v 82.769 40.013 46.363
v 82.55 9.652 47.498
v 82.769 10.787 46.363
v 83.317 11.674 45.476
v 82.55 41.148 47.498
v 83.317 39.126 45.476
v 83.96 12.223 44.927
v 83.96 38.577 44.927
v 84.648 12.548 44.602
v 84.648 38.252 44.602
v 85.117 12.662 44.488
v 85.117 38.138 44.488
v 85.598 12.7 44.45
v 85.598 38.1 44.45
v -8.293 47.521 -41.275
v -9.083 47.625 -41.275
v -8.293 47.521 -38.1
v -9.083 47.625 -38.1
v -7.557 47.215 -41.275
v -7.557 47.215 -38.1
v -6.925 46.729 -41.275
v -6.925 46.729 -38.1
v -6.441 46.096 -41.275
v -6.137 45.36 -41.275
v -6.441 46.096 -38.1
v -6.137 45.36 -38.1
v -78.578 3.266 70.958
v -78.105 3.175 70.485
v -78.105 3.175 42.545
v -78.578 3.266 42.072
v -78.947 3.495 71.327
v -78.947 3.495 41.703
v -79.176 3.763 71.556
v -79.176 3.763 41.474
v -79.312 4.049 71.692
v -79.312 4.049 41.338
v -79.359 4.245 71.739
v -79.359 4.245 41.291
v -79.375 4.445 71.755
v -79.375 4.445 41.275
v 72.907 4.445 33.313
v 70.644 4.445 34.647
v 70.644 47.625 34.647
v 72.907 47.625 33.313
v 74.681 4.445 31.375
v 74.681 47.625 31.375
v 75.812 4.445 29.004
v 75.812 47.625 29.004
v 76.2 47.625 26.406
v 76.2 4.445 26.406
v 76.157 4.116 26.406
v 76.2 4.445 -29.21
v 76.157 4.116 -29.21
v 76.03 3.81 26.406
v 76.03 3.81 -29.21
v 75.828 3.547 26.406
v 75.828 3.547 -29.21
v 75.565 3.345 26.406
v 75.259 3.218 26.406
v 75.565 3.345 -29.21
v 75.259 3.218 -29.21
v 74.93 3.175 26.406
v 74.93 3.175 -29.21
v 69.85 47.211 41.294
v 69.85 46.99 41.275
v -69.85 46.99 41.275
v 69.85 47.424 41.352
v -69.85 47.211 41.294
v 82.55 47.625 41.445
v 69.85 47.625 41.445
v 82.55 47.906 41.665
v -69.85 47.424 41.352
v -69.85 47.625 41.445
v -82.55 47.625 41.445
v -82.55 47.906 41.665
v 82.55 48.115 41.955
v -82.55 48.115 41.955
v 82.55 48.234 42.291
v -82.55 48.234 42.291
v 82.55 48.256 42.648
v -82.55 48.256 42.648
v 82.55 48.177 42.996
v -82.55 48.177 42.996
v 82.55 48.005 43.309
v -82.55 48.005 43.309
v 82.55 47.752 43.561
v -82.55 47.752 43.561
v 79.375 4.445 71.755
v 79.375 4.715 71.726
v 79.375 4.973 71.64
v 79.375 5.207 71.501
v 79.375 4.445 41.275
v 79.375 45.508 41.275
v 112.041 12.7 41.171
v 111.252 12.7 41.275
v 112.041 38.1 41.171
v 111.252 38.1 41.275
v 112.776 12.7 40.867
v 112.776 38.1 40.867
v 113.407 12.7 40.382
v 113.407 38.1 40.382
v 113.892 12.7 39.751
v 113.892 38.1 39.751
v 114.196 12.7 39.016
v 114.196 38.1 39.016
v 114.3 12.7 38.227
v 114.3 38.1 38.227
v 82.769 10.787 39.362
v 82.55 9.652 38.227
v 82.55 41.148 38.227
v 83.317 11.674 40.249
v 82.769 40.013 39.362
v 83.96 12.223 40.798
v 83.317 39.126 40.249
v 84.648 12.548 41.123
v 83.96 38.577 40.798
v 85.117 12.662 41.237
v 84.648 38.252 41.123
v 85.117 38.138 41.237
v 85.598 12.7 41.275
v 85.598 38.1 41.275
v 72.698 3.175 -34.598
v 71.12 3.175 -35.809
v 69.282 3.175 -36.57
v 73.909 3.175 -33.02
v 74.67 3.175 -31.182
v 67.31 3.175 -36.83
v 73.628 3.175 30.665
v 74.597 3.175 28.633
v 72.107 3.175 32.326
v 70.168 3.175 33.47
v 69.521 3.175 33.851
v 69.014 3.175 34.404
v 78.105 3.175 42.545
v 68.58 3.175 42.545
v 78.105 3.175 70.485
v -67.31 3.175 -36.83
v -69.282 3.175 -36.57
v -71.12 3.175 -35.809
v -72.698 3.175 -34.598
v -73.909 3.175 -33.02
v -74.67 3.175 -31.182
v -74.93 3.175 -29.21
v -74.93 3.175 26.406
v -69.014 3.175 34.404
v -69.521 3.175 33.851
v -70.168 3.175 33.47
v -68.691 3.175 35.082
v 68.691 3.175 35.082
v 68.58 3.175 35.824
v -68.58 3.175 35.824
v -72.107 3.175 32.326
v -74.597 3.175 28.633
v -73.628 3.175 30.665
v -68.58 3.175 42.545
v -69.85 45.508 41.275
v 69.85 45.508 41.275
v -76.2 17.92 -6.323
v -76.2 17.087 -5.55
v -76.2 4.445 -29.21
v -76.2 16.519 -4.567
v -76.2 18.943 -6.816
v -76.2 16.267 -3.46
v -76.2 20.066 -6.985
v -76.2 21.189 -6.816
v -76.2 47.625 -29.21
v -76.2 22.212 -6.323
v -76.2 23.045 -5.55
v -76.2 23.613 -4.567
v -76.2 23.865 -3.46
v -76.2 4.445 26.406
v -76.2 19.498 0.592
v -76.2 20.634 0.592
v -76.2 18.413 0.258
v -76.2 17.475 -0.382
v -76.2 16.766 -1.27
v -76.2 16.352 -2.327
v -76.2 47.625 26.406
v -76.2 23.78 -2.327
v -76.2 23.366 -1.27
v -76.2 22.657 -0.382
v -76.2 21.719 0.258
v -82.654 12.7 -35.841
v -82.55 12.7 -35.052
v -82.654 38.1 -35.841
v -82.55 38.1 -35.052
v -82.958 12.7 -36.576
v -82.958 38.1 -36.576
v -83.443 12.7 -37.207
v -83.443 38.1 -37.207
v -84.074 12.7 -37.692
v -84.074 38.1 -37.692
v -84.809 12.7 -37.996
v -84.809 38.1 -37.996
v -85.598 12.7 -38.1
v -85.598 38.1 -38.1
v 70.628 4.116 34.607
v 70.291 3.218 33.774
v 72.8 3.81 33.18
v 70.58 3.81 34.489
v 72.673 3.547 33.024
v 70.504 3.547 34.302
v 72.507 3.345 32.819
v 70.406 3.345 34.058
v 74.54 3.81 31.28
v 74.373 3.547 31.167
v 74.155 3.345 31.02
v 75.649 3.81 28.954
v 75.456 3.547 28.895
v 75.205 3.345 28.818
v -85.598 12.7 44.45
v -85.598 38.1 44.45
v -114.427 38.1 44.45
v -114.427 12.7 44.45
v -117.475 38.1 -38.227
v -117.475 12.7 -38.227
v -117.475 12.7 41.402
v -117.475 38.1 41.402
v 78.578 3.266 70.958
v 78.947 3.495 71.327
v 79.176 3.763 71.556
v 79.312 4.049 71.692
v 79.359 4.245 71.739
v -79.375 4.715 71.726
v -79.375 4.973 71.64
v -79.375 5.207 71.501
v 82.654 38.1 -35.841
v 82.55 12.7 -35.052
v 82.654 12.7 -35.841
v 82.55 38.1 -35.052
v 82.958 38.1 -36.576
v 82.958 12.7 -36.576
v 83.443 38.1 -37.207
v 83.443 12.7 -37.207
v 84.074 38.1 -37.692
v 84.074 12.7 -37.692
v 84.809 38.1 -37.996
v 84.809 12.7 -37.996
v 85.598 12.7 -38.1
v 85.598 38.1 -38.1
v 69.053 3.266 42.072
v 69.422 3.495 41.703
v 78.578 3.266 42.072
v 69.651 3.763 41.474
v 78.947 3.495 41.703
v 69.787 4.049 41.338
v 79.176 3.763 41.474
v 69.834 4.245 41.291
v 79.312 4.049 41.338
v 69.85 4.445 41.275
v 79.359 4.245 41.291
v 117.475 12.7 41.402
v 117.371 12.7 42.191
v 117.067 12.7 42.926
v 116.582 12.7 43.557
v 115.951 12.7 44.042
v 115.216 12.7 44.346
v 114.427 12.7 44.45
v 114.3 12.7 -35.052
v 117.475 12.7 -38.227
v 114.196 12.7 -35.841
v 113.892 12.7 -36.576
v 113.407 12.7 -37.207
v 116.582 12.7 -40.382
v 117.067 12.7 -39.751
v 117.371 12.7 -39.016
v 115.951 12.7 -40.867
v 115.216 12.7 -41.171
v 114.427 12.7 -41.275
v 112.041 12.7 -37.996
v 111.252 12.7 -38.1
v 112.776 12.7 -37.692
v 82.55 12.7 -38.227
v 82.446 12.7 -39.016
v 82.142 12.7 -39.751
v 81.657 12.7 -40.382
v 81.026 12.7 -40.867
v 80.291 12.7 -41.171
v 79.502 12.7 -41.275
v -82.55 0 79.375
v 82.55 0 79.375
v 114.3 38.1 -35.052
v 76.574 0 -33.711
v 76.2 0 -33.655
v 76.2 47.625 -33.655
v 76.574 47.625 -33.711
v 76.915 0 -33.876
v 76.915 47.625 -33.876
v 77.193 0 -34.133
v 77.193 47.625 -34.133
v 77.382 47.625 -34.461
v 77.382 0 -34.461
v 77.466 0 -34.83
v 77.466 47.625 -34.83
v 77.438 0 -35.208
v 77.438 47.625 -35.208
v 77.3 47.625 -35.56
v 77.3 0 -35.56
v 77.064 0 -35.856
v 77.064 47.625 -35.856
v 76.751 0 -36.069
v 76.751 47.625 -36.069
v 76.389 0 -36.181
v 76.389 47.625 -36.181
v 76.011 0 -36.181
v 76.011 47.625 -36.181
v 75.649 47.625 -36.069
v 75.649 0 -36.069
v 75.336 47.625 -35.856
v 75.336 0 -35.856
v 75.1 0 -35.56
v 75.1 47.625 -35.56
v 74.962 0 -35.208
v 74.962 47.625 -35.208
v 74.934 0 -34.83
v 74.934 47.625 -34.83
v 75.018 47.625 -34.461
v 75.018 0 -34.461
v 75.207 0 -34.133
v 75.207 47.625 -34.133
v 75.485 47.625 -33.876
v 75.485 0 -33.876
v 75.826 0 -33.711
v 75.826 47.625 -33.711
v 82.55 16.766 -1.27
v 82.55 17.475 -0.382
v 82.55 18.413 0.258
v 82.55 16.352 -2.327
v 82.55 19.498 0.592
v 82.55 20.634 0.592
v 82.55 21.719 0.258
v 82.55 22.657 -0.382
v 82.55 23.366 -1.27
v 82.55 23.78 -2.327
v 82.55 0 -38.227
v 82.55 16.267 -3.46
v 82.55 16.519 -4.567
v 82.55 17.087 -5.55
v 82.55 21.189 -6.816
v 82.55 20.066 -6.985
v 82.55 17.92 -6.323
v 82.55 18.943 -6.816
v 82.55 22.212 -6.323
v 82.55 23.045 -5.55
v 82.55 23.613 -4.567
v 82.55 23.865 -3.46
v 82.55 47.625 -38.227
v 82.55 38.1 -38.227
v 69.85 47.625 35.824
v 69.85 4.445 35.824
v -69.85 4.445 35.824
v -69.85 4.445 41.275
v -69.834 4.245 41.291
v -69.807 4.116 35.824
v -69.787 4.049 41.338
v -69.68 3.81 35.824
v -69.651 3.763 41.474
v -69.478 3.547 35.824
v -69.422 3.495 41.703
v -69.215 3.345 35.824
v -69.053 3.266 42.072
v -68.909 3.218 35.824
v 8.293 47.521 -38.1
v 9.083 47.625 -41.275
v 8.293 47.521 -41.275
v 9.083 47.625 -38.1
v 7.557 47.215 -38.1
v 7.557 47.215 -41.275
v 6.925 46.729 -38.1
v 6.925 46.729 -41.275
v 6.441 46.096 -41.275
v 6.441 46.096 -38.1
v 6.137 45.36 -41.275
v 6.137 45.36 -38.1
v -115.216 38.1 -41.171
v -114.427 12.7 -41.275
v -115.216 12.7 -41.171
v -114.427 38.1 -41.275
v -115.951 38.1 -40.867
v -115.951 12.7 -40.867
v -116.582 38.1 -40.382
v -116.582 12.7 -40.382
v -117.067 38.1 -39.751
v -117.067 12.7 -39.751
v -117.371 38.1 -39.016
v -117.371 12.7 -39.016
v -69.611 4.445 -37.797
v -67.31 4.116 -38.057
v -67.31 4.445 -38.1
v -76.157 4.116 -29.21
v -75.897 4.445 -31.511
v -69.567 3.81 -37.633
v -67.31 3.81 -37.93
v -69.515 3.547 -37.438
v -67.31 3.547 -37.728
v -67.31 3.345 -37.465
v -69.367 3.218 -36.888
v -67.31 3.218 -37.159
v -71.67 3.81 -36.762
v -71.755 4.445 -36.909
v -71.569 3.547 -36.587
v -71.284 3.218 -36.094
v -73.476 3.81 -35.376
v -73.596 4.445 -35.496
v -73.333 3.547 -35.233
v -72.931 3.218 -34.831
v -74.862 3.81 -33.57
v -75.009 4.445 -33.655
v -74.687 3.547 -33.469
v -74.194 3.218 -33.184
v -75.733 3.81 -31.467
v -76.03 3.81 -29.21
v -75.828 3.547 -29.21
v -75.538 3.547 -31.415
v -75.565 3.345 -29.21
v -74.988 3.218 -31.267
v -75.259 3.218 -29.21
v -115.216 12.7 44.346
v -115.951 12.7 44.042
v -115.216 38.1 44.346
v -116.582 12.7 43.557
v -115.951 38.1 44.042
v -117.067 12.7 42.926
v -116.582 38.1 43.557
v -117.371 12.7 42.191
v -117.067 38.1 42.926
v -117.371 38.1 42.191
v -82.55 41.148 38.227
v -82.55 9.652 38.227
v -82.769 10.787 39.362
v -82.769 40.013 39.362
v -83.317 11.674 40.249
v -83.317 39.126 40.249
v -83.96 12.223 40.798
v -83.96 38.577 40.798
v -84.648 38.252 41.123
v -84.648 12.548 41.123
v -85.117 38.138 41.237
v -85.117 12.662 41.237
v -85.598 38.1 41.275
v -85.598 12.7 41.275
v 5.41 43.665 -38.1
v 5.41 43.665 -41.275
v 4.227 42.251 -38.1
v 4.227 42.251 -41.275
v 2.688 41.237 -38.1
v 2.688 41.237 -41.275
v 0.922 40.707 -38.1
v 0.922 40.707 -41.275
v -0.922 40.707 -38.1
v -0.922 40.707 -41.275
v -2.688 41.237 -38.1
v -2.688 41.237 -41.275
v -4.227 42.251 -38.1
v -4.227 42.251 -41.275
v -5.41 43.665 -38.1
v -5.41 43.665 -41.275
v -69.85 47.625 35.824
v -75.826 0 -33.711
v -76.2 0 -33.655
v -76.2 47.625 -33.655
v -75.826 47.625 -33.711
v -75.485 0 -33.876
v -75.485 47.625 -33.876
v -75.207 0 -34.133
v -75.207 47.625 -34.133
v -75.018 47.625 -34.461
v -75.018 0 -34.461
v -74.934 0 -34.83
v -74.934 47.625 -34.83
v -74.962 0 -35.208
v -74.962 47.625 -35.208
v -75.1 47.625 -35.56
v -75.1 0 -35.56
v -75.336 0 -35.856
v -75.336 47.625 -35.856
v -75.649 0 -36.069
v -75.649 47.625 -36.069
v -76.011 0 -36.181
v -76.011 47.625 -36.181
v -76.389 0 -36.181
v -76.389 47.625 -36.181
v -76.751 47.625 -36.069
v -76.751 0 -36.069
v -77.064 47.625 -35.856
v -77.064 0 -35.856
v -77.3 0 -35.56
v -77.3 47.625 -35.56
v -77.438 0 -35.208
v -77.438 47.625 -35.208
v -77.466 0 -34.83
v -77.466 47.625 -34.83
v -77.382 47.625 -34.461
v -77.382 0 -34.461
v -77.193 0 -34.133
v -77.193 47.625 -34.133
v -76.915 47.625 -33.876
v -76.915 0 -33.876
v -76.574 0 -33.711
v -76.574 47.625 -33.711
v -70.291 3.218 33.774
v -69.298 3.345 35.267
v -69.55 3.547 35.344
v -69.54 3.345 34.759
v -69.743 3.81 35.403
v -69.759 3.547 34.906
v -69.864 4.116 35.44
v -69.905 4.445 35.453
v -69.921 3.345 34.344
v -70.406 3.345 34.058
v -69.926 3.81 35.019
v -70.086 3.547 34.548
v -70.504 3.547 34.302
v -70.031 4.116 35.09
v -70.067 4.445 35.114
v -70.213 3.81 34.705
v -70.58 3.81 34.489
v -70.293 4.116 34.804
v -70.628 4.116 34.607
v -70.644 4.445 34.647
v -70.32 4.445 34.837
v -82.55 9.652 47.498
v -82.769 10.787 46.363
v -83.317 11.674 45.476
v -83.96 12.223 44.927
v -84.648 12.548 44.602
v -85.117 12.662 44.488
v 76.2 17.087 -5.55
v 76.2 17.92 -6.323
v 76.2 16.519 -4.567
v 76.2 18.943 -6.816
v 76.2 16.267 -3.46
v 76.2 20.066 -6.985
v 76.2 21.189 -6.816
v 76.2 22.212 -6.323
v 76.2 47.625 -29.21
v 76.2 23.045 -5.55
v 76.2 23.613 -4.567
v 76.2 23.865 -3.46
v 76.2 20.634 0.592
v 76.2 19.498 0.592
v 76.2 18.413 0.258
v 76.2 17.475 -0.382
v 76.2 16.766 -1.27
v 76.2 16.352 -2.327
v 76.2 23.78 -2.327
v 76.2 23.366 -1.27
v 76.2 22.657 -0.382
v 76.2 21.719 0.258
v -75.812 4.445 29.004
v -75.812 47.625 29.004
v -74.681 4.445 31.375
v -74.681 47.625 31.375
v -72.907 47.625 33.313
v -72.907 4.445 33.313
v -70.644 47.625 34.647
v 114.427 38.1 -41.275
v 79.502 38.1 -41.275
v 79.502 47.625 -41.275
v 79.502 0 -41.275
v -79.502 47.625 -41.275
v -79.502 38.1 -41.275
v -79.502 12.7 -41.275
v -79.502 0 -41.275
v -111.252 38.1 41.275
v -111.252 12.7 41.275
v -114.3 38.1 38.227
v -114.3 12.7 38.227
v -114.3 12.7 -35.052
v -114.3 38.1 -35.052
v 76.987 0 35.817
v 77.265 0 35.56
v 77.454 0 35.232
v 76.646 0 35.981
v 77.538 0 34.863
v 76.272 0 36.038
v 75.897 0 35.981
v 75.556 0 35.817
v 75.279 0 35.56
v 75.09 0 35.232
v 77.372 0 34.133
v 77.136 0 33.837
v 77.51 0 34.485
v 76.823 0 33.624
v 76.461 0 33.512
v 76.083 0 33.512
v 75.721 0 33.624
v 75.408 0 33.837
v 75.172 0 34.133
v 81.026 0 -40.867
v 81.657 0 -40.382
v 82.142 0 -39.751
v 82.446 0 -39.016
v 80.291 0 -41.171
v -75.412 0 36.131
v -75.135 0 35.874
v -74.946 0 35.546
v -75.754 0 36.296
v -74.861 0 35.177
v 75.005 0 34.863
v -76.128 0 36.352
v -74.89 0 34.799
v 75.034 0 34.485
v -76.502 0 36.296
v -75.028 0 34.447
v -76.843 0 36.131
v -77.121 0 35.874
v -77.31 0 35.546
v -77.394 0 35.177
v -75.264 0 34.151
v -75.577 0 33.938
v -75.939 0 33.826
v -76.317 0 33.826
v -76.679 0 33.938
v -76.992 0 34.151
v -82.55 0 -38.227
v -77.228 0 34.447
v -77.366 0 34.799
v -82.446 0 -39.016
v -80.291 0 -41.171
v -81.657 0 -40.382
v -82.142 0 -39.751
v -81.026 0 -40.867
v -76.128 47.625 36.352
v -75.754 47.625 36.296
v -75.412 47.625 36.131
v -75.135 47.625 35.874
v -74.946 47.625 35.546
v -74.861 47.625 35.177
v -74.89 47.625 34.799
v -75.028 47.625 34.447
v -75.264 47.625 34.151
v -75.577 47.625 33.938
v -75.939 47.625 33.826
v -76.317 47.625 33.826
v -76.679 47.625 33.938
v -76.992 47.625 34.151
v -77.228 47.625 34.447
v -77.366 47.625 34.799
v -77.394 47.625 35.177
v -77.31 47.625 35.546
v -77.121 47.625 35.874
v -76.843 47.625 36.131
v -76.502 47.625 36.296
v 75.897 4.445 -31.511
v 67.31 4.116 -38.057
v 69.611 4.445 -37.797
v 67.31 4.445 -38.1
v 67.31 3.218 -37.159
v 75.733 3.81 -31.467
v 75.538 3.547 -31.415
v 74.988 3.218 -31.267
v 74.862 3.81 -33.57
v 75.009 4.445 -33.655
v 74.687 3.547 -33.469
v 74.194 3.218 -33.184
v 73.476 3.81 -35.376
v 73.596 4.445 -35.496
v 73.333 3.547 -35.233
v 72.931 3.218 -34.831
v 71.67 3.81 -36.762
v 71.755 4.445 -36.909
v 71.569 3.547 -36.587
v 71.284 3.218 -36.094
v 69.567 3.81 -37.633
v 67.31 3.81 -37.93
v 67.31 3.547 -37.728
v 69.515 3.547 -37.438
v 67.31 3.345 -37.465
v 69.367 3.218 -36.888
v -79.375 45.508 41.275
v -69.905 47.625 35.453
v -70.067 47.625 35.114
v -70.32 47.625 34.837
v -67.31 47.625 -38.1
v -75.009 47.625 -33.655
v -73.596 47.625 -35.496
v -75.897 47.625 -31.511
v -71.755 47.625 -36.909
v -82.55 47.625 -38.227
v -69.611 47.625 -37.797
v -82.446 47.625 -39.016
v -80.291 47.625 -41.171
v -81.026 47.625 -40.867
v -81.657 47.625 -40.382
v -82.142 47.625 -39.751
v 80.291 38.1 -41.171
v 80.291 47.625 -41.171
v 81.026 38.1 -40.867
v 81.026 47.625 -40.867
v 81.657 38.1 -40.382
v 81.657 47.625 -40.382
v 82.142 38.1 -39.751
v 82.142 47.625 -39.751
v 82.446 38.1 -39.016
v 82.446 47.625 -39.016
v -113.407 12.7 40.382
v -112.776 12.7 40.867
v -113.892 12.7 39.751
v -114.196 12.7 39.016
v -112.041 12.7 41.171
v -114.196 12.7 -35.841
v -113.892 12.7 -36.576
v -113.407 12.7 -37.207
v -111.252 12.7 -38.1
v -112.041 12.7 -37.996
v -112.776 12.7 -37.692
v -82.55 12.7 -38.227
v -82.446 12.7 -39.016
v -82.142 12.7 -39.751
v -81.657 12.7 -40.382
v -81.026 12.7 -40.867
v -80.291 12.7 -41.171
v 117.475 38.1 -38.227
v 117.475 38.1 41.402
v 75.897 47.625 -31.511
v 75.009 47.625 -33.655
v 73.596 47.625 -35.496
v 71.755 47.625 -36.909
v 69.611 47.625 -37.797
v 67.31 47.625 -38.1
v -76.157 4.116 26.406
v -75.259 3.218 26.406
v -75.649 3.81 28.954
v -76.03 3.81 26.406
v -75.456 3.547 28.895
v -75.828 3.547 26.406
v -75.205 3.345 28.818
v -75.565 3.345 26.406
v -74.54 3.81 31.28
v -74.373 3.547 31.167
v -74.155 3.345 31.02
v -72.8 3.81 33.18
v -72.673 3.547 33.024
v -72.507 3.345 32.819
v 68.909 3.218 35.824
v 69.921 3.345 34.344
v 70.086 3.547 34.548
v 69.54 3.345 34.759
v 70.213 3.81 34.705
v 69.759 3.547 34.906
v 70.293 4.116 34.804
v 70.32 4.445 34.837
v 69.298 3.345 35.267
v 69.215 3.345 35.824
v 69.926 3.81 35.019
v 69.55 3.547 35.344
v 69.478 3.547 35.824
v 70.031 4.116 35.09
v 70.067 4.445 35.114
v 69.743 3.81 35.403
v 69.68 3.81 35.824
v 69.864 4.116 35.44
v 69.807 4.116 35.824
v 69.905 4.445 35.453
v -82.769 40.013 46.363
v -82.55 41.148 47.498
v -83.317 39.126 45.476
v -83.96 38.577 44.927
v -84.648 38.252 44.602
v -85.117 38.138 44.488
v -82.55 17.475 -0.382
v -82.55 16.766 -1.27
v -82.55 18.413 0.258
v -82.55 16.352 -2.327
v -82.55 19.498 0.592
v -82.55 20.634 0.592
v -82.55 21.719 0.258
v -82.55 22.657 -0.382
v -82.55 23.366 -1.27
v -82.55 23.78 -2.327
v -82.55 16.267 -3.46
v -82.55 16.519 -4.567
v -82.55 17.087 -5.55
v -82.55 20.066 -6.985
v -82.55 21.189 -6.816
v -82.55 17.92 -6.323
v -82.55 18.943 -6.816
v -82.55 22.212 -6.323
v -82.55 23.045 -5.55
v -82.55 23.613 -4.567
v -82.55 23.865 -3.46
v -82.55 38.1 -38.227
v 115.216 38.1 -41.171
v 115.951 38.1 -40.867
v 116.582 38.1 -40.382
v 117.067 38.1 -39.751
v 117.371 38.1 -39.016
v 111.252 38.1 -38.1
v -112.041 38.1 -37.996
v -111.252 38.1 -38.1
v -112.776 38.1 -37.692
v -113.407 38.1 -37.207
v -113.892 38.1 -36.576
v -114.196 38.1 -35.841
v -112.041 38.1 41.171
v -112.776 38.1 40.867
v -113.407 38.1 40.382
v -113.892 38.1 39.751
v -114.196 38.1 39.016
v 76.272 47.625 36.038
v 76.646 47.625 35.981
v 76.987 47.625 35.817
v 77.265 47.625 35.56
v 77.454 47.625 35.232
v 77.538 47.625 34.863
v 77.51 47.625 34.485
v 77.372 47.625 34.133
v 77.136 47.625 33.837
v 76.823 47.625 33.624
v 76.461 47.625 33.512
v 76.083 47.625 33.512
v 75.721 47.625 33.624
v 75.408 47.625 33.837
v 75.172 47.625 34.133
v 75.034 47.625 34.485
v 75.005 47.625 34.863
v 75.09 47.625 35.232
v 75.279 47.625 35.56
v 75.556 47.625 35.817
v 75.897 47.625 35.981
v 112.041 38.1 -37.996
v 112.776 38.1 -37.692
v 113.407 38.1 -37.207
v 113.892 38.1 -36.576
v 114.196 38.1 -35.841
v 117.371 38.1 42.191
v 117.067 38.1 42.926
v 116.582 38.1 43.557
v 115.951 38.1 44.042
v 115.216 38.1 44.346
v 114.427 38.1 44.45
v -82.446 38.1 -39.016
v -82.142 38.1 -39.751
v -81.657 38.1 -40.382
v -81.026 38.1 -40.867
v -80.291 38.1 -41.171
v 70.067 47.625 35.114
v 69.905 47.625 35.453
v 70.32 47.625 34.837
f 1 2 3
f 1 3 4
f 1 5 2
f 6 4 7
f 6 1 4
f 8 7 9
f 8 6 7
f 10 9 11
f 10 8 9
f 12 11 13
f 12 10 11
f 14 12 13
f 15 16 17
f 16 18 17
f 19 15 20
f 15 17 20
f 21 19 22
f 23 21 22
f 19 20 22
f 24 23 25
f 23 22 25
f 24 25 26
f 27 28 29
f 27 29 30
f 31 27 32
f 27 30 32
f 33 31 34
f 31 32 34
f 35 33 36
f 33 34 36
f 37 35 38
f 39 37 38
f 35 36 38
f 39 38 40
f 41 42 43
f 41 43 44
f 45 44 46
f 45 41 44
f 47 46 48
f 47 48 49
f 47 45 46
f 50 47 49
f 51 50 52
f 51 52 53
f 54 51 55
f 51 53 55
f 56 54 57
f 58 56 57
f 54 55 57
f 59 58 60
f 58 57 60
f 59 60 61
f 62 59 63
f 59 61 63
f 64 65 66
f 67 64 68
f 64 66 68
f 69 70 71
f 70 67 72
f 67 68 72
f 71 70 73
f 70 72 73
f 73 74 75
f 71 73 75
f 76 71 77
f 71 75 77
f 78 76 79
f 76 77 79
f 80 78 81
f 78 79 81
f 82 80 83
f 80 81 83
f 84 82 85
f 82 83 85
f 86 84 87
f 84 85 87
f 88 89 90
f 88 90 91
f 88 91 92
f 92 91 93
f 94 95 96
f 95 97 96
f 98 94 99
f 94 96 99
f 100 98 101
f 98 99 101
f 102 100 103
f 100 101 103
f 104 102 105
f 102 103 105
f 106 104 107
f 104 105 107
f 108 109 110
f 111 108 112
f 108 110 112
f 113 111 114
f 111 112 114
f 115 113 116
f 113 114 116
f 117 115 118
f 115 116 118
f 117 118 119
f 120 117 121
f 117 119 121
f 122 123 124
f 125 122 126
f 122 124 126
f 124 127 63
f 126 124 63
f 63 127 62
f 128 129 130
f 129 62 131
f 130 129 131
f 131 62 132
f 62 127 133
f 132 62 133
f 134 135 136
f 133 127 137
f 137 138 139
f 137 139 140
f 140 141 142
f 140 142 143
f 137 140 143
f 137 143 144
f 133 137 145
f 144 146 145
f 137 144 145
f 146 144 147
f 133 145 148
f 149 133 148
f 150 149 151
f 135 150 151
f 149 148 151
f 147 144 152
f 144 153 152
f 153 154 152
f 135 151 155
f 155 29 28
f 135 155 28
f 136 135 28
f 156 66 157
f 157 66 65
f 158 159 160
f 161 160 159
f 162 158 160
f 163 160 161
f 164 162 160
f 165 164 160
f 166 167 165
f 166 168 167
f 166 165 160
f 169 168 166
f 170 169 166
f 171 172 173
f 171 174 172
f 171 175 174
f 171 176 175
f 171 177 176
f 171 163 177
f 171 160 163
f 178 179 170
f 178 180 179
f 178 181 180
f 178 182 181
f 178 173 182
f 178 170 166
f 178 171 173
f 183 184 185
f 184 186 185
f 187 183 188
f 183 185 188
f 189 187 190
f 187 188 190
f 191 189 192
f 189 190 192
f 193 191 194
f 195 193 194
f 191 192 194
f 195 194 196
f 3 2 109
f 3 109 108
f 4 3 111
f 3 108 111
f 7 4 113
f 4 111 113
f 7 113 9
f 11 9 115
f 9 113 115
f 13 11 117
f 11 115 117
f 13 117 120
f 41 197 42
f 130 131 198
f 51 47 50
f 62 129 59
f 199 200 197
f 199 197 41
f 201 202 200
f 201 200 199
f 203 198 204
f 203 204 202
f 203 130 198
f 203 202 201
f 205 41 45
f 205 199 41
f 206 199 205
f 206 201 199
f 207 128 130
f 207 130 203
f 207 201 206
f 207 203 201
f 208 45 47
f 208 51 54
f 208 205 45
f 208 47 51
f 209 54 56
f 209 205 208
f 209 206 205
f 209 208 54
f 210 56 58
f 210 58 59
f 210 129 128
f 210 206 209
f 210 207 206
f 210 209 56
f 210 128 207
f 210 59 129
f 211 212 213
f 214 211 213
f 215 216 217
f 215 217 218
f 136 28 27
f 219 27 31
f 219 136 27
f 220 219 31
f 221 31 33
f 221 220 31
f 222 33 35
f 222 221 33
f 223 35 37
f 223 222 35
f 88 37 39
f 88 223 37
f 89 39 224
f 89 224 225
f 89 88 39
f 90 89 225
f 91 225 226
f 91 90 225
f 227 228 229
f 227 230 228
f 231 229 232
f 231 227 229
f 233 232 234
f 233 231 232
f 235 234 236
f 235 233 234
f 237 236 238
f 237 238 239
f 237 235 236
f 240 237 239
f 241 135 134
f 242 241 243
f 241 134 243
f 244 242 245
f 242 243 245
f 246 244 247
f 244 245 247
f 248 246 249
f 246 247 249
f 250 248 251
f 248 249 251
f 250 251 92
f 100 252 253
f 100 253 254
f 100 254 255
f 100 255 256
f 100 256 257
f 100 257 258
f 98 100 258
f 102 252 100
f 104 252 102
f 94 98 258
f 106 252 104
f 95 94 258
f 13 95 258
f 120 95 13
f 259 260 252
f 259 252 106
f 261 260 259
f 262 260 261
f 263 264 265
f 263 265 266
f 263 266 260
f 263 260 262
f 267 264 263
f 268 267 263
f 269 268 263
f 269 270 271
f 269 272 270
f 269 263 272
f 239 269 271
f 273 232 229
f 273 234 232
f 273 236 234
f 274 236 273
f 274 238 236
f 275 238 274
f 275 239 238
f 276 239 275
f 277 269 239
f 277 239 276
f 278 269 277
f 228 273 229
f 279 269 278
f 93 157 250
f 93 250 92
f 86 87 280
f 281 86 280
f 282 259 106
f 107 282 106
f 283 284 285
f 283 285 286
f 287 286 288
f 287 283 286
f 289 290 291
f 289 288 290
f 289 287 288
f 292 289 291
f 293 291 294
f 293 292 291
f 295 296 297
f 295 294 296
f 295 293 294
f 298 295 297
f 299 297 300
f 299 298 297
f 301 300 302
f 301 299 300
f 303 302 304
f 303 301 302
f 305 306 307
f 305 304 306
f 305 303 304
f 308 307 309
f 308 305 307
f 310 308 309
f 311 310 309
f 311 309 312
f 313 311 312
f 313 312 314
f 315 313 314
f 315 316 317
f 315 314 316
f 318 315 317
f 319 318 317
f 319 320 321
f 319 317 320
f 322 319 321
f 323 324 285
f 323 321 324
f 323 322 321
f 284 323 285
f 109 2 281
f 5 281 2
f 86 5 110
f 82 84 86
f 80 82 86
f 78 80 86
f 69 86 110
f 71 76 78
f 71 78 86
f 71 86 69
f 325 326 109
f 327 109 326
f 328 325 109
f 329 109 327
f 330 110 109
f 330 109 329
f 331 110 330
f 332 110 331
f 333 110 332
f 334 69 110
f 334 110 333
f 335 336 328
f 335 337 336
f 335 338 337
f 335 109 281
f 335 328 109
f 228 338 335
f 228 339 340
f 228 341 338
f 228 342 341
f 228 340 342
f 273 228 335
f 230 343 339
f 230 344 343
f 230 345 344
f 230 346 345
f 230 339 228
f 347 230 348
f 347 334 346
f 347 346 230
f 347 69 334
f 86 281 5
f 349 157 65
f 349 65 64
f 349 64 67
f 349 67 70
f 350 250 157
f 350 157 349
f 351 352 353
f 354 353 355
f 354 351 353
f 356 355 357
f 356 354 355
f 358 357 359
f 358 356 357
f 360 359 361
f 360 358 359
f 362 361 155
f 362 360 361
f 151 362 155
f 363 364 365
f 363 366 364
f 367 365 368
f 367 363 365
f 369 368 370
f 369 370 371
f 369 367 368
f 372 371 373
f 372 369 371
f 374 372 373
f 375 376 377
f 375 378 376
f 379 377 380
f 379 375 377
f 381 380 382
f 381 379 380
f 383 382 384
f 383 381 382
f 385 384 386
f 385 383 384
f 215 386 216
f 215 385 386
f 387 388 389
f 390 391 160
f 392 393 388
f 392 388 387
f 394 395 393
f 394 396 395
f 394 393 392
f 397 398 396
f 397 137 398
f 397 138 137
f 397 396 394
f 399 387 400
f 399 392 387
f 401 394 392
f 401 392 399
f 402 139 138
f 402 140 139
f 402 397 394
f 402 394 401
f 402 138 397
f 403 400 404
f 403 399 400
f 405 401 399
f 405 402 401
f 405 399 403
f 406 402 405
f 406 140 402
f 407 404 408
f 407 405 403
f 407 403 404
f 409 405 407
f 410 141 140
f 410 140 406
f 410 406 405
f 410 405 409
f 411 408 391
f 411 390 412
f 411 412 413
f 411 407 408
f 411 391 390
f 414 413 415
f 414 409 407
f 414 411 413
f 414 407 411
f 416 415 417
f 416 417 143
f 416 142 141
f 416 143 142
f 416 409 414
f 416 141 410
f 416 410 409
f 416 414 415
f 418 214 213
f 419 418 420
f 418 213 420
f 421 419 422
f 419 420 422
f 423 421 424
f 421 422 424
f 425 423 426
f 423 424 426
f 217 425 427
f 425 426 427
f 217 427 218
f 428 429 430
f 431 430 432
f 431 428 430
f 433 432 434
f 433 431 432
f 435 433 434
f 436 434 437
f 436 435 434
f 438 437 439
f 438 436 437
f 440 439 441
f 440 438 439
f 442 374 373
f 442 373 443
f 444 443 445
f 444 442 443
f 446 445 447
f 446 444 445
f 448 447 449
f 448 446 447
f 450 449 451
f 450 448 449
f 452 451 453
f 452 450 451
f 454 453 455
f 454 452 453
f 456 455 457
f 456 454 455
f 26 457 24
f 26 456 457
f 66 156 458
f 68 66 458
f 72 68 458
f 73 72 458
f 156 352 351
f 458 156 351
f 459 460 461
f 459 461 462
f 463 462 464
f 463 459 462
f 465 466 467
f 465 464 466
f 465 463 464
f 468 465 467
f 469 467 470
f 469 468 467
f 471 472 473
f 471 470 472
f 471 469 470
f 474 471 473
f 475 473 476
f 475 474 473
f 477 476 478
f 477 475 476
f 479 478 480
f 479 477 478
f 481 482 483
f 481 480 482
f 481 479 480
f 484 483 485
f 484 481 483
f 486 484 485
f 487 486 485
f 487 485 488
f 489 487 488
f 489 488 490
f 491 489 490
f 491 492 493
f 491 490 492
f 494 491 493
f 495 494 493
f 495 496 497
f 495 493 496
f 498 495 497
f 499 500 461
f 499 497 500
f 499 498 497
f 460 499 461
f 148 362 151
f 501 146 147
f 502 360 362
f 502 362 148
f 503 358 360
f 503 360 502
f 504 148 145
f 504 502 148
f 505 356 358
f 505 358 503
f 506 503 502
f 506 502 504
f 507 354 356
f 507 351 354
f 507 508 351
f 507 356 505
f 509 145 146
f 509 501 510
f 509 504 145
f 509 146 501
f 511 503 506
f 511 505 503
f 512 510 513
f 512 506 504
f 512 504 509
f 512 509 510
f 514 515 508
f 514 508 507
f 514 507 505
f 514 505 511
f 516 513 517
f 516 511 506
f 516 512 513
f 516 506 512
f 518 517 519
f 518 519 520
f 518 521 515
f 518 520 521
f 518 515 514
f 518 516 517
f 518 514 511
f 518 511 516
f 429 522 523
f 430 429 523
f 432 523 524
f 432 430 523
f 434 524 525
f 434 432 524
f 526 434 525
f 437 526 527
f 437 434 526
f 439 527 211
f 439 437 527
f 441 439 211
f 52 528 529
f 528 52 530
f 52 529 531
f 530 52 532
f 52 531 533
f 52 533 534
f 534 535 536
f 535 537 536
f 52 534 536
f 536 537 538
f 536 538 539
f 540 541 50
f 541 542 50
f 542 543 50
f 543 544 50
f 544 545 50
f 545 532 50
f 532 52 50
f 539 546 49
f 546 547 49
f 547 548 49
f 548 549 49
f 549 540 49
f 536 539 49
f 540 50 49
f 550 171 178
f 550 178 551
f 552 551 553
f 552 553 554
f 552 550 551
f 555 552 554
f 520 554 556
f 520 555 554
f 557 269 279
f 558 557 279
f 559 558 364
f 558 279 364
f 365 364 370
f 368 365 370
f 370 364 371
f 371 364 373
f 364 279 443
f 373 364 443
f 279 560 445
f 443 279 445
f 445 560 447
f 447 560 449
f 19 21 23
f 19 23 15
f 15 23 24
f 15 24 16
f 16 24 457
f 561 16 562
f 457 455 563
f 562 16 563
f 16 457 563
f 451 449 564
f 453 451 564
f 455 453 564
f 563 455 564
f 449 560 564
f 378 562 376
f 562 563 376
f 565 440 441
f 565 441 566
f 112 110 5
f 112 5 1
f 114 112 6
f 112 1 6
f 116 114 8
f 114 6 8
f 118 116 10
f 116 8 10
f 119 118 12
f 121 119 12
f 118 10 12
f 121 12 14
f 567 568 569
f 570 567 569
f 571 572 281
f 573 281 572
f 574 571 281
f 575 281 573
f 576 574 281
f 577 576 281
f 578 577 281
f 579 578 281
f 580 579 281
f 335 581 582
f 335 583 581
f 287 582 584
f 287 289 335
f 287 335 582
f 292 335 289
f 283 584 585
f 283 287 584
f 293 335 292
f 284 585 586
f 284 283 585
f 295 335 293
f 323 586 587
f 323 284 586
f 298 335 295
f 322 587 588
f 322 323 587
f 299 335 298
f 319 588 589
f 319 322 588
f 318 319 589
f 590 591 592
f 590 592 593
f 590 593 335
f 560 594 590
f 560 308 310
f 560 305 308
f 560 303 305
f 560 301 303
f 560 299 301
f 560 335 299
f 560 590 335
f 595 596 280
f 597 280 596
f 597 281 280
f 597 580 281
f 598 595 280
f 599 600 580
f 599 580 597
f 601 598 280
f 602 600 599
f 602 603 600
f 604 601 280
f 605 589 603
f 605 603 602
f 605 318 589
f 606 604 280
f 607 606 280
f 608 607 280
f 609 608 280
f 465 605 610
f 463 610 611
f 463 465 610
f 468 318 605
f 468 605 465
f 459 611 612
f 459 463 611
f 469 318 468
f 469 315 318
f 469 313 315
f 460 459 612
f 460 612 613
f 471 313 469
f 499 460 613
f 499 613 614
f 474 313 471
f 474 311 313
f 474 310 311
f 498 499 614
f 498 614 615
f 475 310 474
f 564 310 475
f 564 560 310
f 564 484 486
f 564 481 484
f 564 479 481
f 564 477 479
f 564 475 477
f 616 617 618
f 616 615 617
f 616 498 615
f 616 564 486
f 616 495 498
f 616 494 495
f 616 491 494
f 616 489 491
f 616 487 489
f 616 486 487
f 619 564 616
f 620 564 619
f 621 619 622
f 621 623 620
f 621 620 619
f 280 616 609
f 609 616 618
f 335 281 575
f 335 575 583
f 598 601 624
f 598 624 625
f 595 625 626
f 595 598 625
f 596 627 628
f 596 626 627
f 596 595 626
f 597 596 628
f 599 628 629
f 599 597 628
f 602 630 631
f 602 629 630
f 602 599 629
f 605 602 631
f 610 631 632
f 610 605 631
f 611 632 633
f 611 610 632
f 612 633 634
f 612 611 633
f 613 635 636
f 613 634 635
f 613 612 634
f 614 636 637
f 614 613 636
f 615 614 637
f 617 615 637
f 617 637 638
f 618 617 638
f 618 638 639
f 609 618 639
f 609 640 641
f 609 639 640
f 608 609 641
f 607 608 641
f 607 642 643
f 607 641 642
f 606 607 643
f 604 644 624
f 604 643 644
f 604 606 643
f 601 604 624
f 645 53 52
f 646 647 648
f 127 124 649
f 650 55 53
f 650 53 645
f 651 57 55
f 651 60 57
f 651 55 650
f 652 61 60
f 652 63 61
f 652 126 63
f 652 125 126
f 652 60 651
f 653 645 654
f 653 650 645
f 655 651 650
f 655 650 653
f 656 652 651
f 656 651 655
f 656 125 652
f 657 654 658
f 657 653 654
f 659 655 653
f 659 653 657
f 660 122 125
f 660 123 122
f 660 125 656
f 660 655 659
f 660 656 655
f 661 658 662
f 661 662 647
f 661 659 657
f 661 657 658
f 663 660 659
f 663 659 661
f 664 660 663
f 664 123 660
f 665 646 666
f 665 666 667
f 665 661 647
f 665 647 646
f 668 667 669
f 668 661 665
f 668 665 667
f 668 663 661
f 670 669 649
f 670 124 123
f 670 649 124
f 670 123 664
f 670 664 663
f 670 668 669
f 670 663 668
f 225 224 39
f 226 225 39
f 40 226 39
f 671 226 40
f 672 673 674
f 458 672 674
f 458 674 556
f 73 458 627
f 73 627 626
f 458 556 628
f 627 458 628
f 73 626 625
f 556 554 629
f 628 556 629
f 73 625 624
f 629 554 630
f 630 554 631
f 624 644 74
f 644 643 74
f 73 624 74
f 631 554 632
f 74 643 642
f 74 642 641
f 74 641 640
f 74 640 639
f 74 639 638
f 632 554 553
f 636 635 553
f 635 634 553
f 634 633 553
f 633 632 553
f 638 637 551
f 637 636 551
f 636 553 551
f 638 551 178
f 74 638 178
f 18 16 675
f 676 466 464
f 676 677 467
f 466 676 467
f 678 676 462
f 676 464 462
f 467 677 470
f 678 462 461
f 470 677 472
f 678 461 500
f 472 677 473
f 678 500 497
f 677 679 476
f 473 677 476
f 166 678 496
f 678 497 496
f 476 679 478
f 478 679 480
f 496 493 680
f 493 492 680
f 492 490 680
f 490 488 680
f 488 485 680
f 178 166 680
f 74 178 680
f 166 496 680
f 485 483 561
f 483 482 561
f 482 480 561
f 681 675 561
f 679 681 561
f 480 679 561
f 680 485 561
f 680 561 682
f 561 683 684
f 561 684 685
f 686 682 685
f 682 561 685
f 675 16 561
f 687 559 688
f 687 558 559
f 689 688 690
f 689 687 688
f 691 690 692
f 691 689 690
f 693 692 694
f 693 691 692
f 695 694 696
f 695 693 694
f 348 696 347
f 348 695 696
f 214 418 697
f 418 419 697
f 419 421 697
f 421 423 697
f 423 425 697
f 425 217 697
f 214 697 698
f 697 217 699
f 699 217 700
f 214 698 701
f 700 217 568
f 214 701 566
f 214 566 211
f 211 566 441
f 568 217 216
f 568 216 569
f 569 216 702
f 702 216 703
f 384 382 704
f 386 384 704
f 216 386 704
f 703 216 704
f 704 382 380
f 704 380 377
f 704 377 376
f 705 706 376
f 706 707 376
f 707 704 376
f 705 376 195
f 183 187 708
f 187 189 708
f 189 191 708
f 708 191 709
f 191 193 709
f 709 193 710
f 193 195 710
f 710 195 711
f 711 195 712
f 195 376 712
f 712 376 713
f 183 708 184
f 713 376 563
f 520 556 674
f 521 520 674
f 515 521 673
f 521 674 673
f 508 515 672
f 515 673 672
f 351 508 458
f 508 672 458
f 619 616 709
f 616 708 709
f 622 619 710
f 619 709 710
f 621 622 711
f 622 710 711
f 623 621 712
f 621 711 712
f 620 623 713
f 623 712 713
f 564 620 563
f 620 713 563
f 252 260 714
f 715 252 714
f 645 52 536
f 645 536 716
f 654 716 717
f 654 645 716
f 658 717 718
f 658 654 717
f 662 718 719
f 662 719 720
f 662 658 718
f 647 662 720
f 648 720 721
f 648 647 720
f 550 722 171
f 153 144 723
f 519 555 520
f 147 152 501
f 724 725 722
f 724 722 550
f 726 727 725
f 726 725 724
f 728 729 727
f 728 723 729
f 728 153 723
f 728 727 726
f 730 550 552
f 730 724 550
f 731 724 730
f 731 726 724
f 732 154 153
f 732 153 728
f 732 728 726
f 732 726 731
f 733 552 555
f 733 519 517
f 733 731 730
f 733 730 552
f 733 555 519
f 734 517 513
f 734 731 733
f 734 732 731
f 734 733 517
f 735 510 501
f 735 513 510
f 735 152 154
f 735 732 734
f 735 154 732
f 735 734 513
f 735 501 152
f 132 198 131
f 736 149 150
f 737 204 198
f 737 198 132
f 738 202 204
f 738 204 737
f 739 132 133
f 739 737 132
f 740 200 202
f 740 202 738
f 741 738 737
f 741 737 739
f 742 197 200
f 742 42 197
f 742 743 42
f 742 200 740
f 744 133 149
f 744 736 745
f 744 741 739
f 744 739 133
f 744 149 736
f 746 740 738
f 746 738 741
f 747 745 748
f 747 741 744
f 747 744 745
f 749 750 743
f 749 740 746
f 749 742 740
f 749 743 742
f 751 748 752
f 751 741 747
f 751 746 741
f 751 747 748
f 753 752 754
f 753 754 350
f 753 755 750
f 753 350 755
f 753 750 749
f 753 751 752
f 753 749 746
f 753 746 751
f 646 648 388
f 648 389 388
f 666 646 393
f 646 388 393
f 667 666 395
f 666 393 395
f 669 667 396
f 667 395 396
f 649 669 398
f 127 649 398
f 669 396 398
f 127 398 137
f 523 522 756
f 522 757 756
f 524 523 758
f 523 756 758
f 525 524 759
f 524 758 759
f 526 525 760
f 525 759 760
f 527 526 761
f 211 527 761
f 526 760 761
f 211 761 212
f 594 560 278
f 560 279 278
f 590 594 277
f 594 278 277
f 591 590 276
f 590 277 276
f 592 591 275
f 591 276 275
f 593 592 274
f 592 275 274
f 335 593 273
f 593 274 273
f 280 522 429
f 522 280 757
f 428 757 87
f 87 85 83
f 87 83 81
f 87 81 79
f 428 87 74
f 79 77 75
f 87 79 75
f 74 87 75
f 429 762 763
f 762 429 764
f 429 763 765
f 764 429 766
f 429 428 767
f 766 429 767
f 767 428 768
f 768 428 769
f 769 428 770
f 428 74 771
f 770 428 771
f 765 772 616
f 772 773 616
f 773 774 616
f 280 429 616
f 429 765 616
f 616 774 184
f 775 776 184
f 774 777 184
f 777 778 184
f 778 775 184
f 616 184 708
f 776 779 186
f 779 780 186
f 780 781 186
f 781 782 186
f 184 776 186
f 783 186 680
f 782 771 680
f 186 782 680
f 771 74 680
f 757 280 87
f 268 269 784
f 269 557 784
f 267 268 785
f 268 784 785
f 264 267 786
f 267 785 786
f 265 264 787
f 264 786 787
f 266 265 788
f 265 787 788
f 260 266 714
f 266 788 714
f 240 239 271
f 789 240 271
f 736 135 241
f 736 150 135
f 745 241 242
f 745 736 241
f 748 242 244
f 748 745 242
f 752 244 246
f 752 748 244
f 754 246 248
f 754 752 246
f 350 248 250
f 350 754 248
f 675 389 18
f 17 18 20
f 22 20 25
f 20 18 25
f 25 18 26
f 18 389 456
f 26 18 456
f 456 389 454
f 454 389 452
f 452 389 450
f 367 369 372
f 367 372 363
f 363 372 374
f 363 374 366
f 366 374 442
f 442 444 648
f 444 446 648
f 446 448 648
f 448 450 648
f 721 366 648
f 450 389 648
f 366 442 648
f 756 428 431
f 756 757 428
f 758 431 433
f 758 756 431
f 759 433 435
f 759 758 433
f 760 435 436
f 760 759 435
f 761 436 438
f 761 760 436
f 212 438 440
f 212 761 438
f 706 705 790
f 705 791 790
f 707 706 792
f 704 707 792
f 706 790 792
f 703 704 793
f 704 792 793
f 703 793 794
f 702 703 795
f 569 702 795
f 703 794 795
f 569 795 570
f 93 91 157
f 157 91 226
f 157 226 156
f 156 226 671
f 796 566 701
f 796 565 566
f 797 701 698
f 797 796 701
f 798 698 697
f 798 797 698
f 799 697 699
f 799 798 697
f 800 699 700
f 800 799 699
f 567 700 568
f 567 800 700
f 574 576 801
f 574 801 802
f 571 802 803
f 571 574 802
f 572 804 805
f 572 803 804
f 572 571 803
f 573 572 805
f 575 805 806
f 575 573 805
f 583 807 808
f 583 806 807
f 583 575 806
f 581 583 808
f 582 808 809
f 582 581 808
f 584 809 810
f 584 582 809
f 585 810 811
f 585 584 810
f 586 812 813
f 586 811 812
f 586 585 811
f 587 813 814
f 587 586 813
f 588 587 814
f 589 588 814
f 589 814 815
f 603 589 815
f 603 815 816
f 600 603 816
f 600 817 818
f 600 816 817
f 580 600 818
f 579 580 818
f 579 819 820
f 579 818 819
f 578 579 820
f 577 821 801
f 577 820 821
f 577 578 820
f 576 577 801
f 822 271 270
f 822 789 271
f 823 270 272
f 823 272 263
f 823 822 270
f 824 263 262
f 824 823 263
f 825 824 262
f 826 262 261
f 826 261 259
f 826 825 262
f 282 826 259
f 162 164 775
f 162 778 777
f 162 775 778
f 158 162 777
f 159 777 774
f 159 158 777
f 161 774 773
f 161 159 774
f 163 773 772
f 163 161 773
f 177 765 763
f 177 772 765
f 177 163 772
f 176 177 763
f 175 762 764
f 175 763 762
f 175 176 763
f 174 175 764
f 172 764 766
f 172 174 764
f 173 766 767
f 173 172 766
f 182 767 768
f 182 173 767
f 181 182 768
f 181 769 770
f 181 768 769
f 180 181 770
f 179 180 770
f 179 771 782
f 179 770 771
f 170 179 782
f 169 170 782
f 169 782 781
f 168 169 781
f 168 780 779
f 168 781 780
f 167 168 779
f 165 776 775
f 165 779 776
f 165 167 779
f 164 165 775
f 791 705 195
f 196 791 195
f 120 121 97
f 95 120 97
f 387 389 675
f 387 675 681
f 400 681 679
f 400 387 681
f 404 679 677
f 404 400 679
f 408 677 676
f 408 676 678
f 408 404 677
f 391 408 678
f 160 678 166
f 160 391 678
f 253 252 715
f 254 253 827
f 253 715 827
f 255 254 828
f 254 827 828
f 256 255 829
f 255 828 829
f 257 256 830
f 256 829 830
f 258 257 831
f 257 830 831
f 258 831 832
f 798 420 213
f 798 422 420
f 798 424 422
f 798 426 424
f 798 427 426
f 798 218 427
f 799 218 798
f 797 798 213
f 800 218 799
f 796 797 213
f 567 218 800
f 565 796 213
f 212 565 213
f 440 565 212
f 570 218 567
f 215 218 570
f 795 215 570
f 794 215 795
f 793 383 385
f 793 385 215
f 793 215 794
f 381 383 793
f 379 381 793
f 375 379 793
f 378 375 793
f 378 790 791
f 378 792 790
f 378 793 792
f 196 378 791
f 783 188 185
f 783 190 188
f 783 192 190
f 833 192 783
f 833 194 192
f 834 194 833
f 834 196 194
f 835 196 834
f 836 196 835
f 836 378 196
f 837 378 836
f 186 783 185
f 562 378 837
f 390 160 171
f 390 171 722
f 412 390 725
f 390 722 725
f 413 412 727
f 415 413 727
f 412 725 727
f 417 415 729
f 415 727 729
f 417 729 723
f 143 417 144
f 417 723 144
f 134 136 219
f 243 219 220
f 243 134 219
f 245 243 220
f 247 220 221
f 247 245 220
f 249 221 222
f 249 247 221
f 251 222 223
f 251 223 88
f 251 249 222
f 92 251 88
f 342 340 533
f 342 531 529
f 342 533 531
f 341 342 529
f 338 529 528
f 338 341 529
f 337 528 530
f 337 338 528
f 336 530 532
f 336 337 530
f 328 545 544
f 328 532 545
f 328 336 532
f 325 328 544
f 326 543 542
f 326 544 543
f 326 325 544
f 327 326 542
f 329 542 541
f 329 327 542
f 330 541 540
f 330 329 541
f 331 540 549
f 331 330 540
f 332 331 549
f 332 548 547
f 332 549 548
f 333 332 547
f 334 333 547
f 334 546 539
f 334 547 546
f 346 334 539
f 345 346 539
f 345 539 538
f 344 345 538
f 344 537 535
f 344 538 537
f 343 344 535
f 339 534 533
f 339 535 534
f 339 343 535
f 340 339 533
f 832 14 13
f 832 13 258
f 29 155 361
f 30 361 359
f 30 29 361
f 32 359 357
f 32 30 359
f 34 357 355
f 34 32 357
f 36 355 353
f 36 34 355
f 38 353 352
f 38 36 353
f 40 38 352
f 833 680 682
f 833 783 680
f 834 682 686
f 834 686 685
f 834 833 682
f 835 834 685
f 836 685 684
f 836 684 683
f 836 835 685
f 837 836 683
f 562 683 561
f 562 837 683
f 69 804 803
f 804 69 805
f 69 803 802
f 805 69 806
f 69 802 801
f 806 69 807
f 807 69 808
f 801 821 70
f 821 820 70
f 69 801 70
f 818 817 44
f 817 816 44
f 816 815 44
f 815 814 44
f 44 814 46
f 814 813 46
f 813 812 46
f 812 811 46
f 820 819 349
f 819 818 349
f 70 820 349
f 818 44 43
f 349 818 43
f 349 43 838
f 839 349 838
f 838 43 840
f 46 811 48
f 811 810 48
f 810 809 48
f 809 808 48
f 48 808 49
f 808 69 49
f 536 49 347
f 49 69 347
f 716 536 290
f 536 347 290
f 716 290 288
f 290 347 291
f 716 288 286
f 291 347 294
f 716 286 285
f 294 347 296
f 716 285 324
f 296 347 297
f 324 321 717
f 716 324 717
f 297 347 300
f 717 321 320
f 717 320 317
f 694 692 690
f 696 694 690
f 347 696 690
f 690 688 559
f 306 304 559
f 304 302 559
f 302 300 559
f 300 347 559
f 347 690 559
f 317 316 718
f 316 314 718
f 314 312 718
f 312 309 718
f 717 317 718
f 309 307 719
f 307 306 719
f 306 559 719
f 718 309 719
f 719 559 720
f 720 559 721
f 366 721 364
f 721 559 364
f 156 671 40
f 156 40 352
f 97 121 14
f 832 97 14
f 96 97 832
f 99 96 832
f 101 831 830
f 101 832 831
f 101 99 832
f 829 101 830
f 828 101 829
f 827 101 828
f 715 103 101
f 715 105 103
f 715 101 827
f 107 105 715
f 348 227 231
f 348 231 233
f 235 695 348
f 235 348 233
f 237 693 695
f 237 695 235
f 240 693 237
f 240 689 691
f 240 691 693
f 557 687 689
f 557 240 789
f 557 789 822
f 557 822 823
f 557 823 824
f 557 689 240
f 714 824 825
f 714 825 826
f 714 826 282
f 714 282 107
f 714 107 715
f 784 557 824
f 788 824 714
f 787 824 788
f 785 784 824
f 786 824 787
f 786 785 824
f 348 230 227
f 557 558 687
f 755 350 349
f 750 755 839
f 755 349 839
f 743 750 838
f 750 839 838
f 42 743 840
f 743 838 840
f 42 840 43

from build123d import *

# Parameters (mm, degrees)
SKETCH1_W               = 152.4
SKETCH1_H               = 76.2
BOSS_EXTRUDE1_DEPTH     = 50.8
SKETCH1_3_W             = 152.4
SKETCH1_3_H             = 76.2
BOSS_EXTRUDE2_DEPTH     = 3.175
SKETCH8_W               = 152.4
SKETCH8_H               = 47.625
CUT_EXTRUDE1_DEPTH      = 6.35
BOSS_EXTRUDE10_REACH    = 212.462
BOSS_EXTRUDE11_DEPTH    = 3.175
SKETCH12_W              = 34.925
SKETCH12_H              = 38.1
BOSS_EXTRUDE12_DEPTH    = 3.175
CUT_EXTRUDE2_DEPTH      = 153.300748931
CUT_EXTRUDE2_DEPTH_BACK = 153.300748931
SKETCH13_W              = 34.925
SKETCH13_H              = 12.7
SKETCH14_W              = 34.925
SKETCH14_H              = 85.725
CUT_EXTRUDE3_DEPTH      = 12.7
CUT_EXTRUDE4_DEPTH      = 6.096
CUT_EXTRUDE4_DEPTH_BACK = 173.99
SKETCH16_R              = 3.81
SKETCH17_W              = 165.1
SKETCH17_H              = 82.55
CUT_EXTRUDE5_DEPTH      = 3.175
SKETCH25_W              = 6.35
SKETCH25_H              = 6.35
BOSS_EXTRUDE16_DEPTH    = 44.45
FILLET2_R               = 8.89
FILLET3_R               = 1.27
CUT_EXTRUDE8_DEPTH      = 150.562384559
CUT_EXTRUDE8_DEPTH_BACK = 150.562384559
SKETCH26_R              = 1.27
FILLET4_R               = 3.048
CUT_EXTRUDE9_DEPTH      = 176.173701579
CUT_EXTRUDE9_DEPTH_BACK = 7.366
SKETCH27_R              = 6.35
FILLET5_R               = 3.048


with BuildPart() as part:
    # Sketch1 → Boss-Extrude1 (new body)
    with BuildSketch(Plane(origin=(0, 0, 0), x_dir=(1, 0, 0), z_dir=(0, 1, 0))):
        Polygon((-117.475, 41.275), (-117.475, -41.275), (-114.3, -41.275), (-114.3, 38.1), (-82.55, 38.1), (-82.55, -41.275), (82.55, -41.275), (82.55, 38.1), (114.3, 38.1), (114.3, -41.275), (117.475, -41.275), (117.475, 41.275), align=None)
        Rectangle(SKETCH1_W, SKETCH1_H, mode=Mode.SUBTRACT)
    extrude(amount=BOSS_EXTRUDE1_DEPTH)

    # Sketch1<3> → Boss-Extrude2 (add)
    with BuildSketch(Plane(origin=(0, 0, 0), x_dir=(1, 0, 0), z_dir=(0, 1, 0))):
        Rectangle(SKETCH1_3_W, SKETCH1_3_H)
    extrude(amount=BOSS_EXTRUDE2_DEPTH)

    # Sketch8 → Cut-Extrude1 (cut)
    with BuildSketch(Plane.XY.offset(41.275)):
        with Locations((0, 26.9875)):
            Rectangle(SKETCH8_W, SKETCH8_H)
    extrude(amount=-CUT_EXTRUDE1_DEPTH, mode=Mode.SUBTRACT)

    # Boss-Extrude10: up to this face of the body (flat: up to its plane)
    boss_extrude10_end = Plane(part.part.faces().sort_by_distance((82.55, 25.4, 1.5875))[0])
    # Sketch10 → Boss-Extrude10 (add, up to the picked face)
    with BuildSketch(Plane.ZY.offset(82.55), mode=Mode.PRIVATE) as boss_extrude10_sk1:
        Polygon((41.275, 50.8), (79.375, 0), (41.275, 0), (41.275, 3.175), (73.025, 3.175), (41.275, 45.508333333), align=None)
    boss_extrude10_tool1 = split(extrude(boss_extrude10_sk1.sketch, amount=-BOSS_EXTRUDE10_REACH, mode=Mode.PRIVATE), bisect_by=boss_extrude10_end, keep=Keep.BOTH, mode=Mode.PRIVATE)
    add(boss_extrude10_tool1.solids().sort_by(Axis((-82.55, 25.019, 59.817), (1, 0, 0)))[0])

    # Sketch11 → Boss-Extrude11 (add)
    with BuildSketch(Plane(origin=(82.55, 0, 0), x_dir=(0, 0, -1), z_dir=(1, 0, 0))):
        Polygon((-41.275, 45.508333333), (-73.025, 3.175), (-41.275, 3.175), align=None)
    boss_extrude11 = extrude(amount=-BOSS_EXTRUDE11_DEPTH)

    # Sketch12 → Boss-Extrude12 (add)
    with BuildSketch(Plane.XY.offset(41.275)):
        with Locations((100.0125, 19.05)):
            Rectangle(SKETCH12_W, SKETCH12_H)
    boss_extrude12 = extrude(amount=BOSS_EXTRUDE12_DEPTH)

    # Mirror2: Boss-Extrude11 across plane
    add(boss_extrude11.mirror(Plane(origin=(0, 0, 0), x_dir=(0, 0, 1), z_dir=(1, 0, 0))))

    # Mirror3: Boss-Extrude12 across plane
    add(boss_extrude12.mirror(Plane(origin=(0, 0, 0), x_dir=(0, 0, 1), z_dir=(1, 0, 0))))

    # Sketch13 → Cut-Extrude2 (cut, two sides: drawn at the far end of the back side and taken through both)
    with BuildSketch(Plane.XY.offset(41.275).offset(-CUT_EXTRUDE2_DEPTH_BACK)):
        with Locations((100.0125, 44.45)):
            Rectangle(SKETCH13_W, SKETCH13_H)
        with Locations((-100.0125, 44.45)):
            Rectangle(SKETCH13_W, SKETCH13_H)
    extrude(amount=CUT_EXTRUDE2_DEPTH + CUT_EXTRUDE2_DEPTH_BACK, mode=Mode.SUBTRACT)

    # Sketch14 → Cut-Extrude3 (cut)
    with BuildSketch(Plane(origin=(0, 0, 0), x_dir=(-1, 0, 0), z_dir=(0, -1, 0))):
        with Locations((-100.0125, -1.5875)):
            Rectangle(SKETCH14_W, SKETCH14_H)
    cut_extrude3 = extrude(amount=-CUT_EXTRUDE3_DEPTH, mode=Mode.SUBTRACT)

    # Mirror4: Cut-Extrude3 across plane
    add(cut_extrude3.mirror(Plane(origin=(0, 0, 0), x_dir=(0, 0, 1), z_dir=(1, 0, 0))), mode=Mode.SUBTRACT)

    # Sketch16 → Cut-Extrude4 (cut, two sides: drawn at the far end of the back side and taken through both)
    with BuildSketch(Plane.ZY.offset(82.55).offset(-CUT_EXTRUDE4_DEPTH_BACK)):
        with Locations(Location((-3.175, 20.066, 0), (0, 0, 180))):
            Circle(SKETCH16_R)
    extrude(amount=CUT_EXTRUDE4_DEPTH + CUT_EXTRUDE4_DEPTH_BACK, mode=Mode.SUBTRACT)

    # Sketch17 → Cut-Extrude5 (cut)
    with BuildSketch(Plane(origin=(0, 50.8, 0), x_dir=(1, 0, 0), z_dir=(0, 1, 0))):
        Rectangle(SKETCH17_W, SKETCH17_H)
    extrude(amount=-CUT_EXTRUDE5_DEPTH, mode=Mode.SUBTRACT)

    # Sketch25 → Boss-Extrude16 (add)
    with BuildSketch(Plane(origin=(0, 3.175, 0), x_dir=(1, 0, 0), z_dir=(0, 1, 0))):
        with Locations((73.025, -38.1)):
            Rectangle(SKETCH25_W, SKETCH25_H)
        with Locations((-73.025, -38.1)):
            Rectangle(SKETCH25_W, SKETCH25_H)
    extrude(amount=BOSS_EXTRUDE16_DEPTH)

    # Fillet2
    # the kernel refuses this fillet: 8.89 mm, written as the material it adds along each edge
    with BuildSketch(Plane(origin=(76.2, 3.175, 34.925), x_dir=(0, 0, -1), z_dir=(0, 1, 0))) as fillet2_piece_1:
        with BuildLine():
            CenterArc((8.519418994, 8.89), FILLET2_R, 196.601549599, 73.398450401)
            Line((0, 6.35), (-0.17038838, 6.2992))
            ThreePointArc((-0.17038838, 6.2992), (-0.1778, 3.175), (-0.1778, 0))
            Line((-0.1778, 0), (0, -0.1778))
            Line((0, -0.1778), (8.519418994, -0.1778))
            Line((8.519418994, -0.1778), (8.519418994, 0))
        make_face()
    extrude(amount=44.45)
    with BuildSketch(Plane(origin=(76.2, 3.175, -38.1), x_dir=(-1, 0, 0), z_dir=(0, 1, 0)), Plane(origin=(-76.2, 3.175, -38.1), x_dir=(0, 0, 1), z_dir=(0, 1, 0))) as fillet2_piece_2:
        with BuildLine():
            CenterArc((FILLET2_R, FILLET2_R), FILLET2_R, 180, 90)
            Line((0, FILLET2_R), (-FILLET2_R * 0.02, FILLET2_R))
            Line((-FILLET2_R * 0.02, FILLET2_R), (-FILLET2_R * 0.02, -FILLET2_R * 0.02))
            Line((-FILLET2_R * 0.02, -FILLET2_R * 0.02), (FILLET2_R, -FILLET2_R * 0.02))
            Line((FILLET2_R, -FILLET2_R * 0.02), (FILLET2_R, 0))
        make_face()
    extrude(amount=44.45)
    with BuildSketch(Plane(origin=(-76.2, 3.175, 34.925), x_dir=(1, 0, 0), z_dir=(0, 1, 0))) as fillet2_piece_3:
        with BuildLine():
            CenterArc((8.89, 8.519418994), FILLET2_R, 180, 73.398450401)
            Line((0, 8.519418994), (-0.1778, 8.519418994))
            Line((-0.1778, 8.519418994), (-0.1778, 0))
            Line((-0.1778, 0), (0, -0.1778))
            ThreePointArc((0, -0.1778), (3.175, -0.1778), (6.2992, -0.17038838))
            Line((6.2992, -0.17038838), (6.35, 0))
        make_face()
    extrude(amount=44.45)

    # Fillet3
    fillet3_edges = [part.edges().sort_by_distance(p)[0] for p in [
        (74.6125, 3.175, 41.275),
        (79.375, 3.175, 57.15),
        (0, 3.175, 73.025),
        (-79.375, 3.175, 57.15),
        (-74.6125, 3.175, 41.275),
        (-69.85, 3.175, 38.1),
        (-74.437857322, 3.175, 31.718372174),
        (-76.2, 3.175, -1.402209497),
        (-73.596179285, 3.175, -35.496179285),
        (0, 3.175, -38.1),
        (73.596179285, 3.175, -35.496179285),
        (76.2, 3.175, -1.402209497),
        (74.437857322, 3.175, 31.718372174),
        (69.85, 3.175, 38.1),
        (-69.85, 25.4, 34.925),
        (69.85, 25.4, 34.925),
        (0, 50.8, 41.275),
    ]]
    fillet(fillet3_edges, radius=FILLET3_R)

    # Sketch26 → Cut-Extrude8 (cut, two sides: drawn at the far end of the back side and taken through both)
    with BuildSketch(Plane(origin=(0, 47.625, 0), x_dir=(1, 0, 0), z_dir=(0, 1, 0)).offset(-CUT_EXTRUDE8_DEPTH_BACK)):
        with Locations(Location((-76.2, 34.925, 0), (0, 0, 270))):
            Circle(SKETCH26_R)
        with Locations(Location((76.2, 34.925, 0), (0, 0, 270))):
            Circle(SKETCH26_R)
        with Locations(Location((76.271823643, -34.767866531, 0), (0, 0, 270))):
            Circle(SKETCH26_R)
        with Locations(Location((-76.127852634, -35.081985097, 0), (0, 0, 270))):
            Circle(SKETCH26_R)
    extrude(amount=CUT_EXTRUDE8_DEPTH + CUT_EXTRUDE8_DEPTH_BACK, mode=Mode.SUBTRACT)

    # Fillet4
    fillet4_edges = [part.edges().sort_by_distance(p)[0] for p in [
        (-114.3, 25.4, 41.275),
        (-114.3, 25.4, -38.1),
        (-82.55, 25.4, -38.1),
        (-82.55, 25.4, 41.275),
        (82.55, 25.4, 41.275),
        (114.3, 25.4, 41.275),
        (114.3, 25.4, -38.1),
        (82.55, 25.4, -38.1),
        (82.55, 12.7, 42.8625),
        (-82.55, 12.7, 42.8625),
        (-82.55, 38.1, 42.8625),
        (82.55, 38.1, 42.8625),
        (117.475, 25.4, -41.275),
        (117.475, 25.4, 44.45),
        (82.55, 25.4, 44.45),
        (-117.475, 25.4, 44.45),
        (-82.55, 25.4, 44.45),
        (-117.475, 25.4, -41.275),
        (-82.55, 6.35, -41.275),
        (82.55, 6.35, -41.275),
        (82.55, 42.8625, -41.275),
        (-82.55, 42.8625, -41.275),
    ]]
    fillet(fillet4_edges, radius=FILLET4_R)

    # Sketch27 → Cut-Extrude9 (cut, two sides: drawn at the far end of the back side and taken through both)
    with BuildSketch(Plane(origin=(0, 0, -41.275), x_dir=(-1, 0, 0), z_dir=(0, 0, -1)).offset(-CUT_EXTRUDE9_DEPTH_BACK)):
        with Locations((0, 46.99)):
            Circle(SKETCH27_R)
    extrude(amount=CUT_EXTRUDE9_DEPTH + CUT_EXTRUDE9_DEPTH_BACK, mode=Mode.SUBTRACT)

    # Fillet5
    fillet5_edges = [part.edges().sort_by_distance(p)[0] for p in [
        (6.318170226, 47.625, -39.6875),
        (-6.318170226, 47.625, -39.6875),
    ]]
    fillet(fillet5_edges, radius=FILLET5_R)


solid = part.part
